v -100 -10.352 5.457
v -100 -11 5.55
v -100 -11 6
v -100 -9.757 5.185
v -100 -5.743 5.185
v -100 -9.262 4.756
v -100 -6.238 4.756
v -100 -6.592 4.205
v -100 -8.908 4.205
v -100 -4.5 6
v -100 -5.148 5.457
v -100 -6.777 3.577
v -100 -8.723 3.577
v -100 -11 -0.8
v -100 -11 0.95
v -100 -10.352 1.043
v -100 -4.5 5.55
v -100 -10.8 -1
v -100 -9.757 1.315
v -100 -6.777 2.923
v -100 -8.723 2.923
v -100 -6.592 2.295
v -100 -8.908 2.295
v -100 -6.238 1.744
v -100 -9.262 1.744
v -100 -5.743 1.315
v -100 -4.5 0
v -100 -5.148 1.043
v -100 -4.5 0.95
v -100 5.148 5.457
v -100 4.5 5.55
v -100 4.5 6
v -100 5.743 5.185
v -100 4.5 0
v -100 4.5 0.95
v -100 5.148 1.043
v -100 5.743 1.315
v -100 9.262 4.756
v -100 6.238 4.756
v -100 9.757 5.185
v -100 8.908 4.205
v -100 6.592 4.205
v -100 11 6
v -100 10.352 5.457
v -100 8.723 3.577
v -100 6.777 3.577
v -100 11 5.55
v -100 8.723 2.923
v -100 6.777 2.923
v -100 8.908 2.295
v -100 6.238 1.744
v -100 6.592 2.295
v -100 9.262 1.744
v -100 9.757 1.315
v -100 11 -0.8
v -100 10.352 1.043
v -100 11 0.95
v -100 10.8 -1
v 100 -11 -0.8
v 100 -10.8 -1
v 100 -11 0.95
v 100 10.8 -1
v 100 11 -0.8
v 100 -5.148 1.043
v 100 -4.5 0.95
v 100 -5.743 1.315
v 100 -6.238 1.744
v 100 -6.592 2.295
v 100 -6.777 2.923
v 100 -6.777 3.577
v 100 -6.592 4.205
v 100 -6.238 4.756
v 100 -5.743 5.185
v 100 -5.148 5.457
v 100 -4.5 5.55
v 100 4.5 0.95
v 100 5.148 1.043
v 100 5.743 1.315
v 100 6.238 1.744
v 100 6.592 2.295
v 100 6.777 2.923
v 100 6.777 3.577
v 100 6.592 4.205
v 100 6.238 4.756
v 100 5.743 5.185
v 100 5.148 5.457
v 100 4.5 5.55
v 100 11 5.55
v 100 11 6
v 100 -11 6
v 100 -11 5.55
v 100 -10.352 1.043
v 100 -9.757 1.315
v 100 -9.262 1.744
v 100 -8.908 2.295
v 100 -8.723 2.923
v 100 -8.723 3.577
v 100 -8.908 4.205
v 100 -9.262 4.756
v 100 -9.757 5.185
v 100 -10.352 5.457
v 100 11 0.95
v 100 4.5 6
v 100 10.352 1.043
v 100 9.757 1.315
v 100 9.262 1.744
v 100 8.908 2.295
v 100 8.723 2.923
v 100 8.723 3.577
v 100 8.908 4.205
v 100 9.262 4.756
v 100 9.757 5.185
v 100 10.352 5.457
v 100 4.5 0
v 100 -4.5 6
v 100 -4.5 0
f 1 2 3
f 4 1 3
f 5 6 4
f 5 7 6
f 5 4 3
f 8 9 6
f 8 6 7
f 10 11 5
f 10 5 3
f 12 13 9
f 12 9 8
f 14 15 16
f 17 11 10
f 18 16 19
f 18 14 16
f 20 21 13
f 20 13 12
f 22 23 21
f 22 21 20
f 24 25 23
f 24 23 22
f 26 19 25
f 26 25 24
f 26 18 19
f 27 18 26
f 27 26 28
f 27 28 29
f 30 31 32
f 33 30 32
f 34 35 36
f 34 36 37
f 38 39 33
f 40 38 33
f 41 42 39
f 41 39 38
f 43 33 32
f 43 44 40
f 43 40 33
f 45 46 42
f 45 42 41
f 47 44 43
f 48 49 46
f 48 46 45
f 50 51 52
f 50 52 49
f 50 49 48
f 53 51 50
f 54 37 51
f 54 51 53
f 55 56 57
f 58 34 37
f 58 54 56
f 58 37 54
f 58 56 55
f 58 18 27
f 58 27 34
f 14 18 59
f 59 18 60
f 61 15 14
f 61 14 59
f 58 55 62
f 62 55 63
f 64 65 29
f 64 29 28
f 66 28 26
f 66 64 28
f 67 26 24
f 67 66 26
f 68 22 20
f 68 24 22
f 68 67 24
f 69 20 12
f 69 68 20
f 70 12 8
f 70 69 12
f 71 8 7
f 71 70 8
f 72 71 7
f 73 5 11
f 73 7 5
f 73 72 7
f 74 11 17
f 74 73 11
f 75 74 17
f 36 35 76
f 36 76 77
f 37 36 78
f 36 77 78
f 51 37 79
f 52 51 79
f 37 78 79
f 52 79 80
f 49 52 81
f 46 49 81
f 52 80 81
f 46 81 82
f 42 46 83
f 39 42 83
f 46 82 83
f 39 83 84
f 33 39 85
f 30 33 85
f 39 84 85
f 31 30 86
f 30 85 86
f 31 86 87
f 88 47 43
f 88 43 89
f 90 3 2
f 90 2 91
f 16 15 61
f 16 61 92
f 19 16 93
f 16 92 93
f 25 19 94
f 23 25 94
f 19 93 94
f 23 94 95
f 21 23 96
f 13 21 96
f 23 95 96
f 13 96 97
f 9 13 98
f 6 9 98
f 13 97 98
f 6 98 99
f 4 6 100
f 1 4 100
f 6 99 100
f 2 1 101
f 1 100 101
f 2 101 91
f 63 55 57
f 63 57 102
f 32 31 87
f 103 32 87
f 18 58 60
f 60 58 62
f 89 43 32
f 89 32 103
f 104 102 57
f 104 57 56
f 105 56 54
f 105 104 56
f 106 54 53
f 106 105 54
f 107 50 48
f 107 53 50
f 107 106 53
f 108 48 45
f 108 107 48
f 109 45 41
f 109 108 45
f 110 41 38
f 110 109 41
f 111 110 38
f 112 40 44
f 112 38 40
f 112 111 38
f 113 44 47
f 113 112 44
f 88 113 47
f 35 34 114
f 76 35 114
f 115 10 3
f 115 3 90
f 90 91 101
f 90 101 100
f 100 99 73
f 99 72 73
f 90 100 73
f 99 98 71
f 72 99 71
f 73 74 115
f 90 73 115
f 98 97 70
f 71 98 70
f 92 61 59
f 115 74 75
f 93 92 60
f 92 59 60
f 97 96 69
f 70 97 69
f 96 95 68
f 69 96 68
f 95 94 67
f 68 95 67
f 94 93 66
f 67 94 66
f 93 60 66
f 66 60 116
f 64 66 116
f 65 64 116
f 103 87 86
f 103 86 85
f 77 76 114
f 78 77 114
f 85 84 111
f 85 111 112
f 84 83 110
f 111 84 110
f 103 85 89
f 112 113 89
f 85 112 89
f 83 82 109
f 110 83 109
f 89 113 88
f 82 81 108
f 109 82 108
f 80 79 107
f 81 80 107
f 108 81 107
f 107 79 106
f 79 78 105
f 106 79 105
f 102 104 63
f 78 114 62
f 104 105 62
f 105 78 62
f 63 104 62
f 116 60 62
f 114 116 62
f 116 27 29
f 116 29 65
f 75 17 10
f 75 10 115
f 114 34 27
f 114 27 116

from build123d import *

# Parameters (mm, degrees)
SKETCH1_W              = 200
SKETCH1_H              = 22
BOSS_EXTRUDE1_DEPTH    = 1
SKETCH2_W              = 200
SKETCH2_H              = 6.5
BOSS_EXTRUDE2_DEPTH    = 6
SKETCH5_R              = 2.3
SLOT_1_DEPTH           = 101.781942827
SLOT_2_COPY_1_SKETCH_R = 2.3
SLOT_2_COPY_1_DEPTH    = 101.781942827
DEBURS_SIZE            = 0.2


with BuildPart() as part:
    # Sketch1 → Boss-Extrude1 (new body)
    with BuildSketch(Plane.XY):
        Rectangle(SKETCH1_W, SKETCH1_H)
    extrude(amount=-BOSS_EXTRUDE1_DEPTH)

    # Sketch2 → Boss-Extrude2 (add)
    with BuildSketch(Plane.XY):
        with Locations((0, 7.75)):
            Rectangle(SKETCH2_W, SKETCH2_H)
        with Locations((0, -7.75)):
            Rectangle(SKETCH2_W, SKETCH2_H)
    extrude(amount=BOSS_EXTRUDE2_DEPTH)

    # Sketch5 → Slot 1 (cut, symmetric)
    with BuildSketch(Plane(origin=(0, 0, 0), x_dir=(0, 0, -1), z_dir=(1, 0, 0))):
        with Locations((-3.25, 4.5)):
            Circle(SKETCH5_R)
    slot_1 = extrude(amount=SLOT_1_DEPTH, both=True, mode=Mode.SUBTRACT)

    # Slot 1x2: Slot 1 across plane
    add(slot_1.mirror(Plane(origin=(0, 7.75, 0), x_dir=(0, 0, 1), z_dir=(0, -1, 0))), mode=Mode.SUBTRACT)

    # Slot 2: Slot 1 across plane
    add(slot_1.mirror(Plane.ZX), mode=Mode.SUBTRACT)

    # Slot 2 copy 1 sketch → Slot 2 copy 1 (cut, symmetric)
    with BuildSketch(Plane(origin=(0, -15.5, 0), x_dir=(0, 0, -1), z_dir=(1, 0, 0))):
        with Locations((-3.25, 4.5)):
            Circle(SLOT_2_COPY_1_SKETCH_R)
    extrude(amount=SLOT_2_COPY_1_DEPTH, both=True, mode=Mode.SUBTRACT)

    # Deburs
    deburs_edges = [part.edges().sort_by_distance(p)[0] for p in [
        (0, 11, -1),
        (0, -11, -1),
    ]]
    chamfer(deburs_edges, length=DEBURS_SIZE)


solid = part.part
